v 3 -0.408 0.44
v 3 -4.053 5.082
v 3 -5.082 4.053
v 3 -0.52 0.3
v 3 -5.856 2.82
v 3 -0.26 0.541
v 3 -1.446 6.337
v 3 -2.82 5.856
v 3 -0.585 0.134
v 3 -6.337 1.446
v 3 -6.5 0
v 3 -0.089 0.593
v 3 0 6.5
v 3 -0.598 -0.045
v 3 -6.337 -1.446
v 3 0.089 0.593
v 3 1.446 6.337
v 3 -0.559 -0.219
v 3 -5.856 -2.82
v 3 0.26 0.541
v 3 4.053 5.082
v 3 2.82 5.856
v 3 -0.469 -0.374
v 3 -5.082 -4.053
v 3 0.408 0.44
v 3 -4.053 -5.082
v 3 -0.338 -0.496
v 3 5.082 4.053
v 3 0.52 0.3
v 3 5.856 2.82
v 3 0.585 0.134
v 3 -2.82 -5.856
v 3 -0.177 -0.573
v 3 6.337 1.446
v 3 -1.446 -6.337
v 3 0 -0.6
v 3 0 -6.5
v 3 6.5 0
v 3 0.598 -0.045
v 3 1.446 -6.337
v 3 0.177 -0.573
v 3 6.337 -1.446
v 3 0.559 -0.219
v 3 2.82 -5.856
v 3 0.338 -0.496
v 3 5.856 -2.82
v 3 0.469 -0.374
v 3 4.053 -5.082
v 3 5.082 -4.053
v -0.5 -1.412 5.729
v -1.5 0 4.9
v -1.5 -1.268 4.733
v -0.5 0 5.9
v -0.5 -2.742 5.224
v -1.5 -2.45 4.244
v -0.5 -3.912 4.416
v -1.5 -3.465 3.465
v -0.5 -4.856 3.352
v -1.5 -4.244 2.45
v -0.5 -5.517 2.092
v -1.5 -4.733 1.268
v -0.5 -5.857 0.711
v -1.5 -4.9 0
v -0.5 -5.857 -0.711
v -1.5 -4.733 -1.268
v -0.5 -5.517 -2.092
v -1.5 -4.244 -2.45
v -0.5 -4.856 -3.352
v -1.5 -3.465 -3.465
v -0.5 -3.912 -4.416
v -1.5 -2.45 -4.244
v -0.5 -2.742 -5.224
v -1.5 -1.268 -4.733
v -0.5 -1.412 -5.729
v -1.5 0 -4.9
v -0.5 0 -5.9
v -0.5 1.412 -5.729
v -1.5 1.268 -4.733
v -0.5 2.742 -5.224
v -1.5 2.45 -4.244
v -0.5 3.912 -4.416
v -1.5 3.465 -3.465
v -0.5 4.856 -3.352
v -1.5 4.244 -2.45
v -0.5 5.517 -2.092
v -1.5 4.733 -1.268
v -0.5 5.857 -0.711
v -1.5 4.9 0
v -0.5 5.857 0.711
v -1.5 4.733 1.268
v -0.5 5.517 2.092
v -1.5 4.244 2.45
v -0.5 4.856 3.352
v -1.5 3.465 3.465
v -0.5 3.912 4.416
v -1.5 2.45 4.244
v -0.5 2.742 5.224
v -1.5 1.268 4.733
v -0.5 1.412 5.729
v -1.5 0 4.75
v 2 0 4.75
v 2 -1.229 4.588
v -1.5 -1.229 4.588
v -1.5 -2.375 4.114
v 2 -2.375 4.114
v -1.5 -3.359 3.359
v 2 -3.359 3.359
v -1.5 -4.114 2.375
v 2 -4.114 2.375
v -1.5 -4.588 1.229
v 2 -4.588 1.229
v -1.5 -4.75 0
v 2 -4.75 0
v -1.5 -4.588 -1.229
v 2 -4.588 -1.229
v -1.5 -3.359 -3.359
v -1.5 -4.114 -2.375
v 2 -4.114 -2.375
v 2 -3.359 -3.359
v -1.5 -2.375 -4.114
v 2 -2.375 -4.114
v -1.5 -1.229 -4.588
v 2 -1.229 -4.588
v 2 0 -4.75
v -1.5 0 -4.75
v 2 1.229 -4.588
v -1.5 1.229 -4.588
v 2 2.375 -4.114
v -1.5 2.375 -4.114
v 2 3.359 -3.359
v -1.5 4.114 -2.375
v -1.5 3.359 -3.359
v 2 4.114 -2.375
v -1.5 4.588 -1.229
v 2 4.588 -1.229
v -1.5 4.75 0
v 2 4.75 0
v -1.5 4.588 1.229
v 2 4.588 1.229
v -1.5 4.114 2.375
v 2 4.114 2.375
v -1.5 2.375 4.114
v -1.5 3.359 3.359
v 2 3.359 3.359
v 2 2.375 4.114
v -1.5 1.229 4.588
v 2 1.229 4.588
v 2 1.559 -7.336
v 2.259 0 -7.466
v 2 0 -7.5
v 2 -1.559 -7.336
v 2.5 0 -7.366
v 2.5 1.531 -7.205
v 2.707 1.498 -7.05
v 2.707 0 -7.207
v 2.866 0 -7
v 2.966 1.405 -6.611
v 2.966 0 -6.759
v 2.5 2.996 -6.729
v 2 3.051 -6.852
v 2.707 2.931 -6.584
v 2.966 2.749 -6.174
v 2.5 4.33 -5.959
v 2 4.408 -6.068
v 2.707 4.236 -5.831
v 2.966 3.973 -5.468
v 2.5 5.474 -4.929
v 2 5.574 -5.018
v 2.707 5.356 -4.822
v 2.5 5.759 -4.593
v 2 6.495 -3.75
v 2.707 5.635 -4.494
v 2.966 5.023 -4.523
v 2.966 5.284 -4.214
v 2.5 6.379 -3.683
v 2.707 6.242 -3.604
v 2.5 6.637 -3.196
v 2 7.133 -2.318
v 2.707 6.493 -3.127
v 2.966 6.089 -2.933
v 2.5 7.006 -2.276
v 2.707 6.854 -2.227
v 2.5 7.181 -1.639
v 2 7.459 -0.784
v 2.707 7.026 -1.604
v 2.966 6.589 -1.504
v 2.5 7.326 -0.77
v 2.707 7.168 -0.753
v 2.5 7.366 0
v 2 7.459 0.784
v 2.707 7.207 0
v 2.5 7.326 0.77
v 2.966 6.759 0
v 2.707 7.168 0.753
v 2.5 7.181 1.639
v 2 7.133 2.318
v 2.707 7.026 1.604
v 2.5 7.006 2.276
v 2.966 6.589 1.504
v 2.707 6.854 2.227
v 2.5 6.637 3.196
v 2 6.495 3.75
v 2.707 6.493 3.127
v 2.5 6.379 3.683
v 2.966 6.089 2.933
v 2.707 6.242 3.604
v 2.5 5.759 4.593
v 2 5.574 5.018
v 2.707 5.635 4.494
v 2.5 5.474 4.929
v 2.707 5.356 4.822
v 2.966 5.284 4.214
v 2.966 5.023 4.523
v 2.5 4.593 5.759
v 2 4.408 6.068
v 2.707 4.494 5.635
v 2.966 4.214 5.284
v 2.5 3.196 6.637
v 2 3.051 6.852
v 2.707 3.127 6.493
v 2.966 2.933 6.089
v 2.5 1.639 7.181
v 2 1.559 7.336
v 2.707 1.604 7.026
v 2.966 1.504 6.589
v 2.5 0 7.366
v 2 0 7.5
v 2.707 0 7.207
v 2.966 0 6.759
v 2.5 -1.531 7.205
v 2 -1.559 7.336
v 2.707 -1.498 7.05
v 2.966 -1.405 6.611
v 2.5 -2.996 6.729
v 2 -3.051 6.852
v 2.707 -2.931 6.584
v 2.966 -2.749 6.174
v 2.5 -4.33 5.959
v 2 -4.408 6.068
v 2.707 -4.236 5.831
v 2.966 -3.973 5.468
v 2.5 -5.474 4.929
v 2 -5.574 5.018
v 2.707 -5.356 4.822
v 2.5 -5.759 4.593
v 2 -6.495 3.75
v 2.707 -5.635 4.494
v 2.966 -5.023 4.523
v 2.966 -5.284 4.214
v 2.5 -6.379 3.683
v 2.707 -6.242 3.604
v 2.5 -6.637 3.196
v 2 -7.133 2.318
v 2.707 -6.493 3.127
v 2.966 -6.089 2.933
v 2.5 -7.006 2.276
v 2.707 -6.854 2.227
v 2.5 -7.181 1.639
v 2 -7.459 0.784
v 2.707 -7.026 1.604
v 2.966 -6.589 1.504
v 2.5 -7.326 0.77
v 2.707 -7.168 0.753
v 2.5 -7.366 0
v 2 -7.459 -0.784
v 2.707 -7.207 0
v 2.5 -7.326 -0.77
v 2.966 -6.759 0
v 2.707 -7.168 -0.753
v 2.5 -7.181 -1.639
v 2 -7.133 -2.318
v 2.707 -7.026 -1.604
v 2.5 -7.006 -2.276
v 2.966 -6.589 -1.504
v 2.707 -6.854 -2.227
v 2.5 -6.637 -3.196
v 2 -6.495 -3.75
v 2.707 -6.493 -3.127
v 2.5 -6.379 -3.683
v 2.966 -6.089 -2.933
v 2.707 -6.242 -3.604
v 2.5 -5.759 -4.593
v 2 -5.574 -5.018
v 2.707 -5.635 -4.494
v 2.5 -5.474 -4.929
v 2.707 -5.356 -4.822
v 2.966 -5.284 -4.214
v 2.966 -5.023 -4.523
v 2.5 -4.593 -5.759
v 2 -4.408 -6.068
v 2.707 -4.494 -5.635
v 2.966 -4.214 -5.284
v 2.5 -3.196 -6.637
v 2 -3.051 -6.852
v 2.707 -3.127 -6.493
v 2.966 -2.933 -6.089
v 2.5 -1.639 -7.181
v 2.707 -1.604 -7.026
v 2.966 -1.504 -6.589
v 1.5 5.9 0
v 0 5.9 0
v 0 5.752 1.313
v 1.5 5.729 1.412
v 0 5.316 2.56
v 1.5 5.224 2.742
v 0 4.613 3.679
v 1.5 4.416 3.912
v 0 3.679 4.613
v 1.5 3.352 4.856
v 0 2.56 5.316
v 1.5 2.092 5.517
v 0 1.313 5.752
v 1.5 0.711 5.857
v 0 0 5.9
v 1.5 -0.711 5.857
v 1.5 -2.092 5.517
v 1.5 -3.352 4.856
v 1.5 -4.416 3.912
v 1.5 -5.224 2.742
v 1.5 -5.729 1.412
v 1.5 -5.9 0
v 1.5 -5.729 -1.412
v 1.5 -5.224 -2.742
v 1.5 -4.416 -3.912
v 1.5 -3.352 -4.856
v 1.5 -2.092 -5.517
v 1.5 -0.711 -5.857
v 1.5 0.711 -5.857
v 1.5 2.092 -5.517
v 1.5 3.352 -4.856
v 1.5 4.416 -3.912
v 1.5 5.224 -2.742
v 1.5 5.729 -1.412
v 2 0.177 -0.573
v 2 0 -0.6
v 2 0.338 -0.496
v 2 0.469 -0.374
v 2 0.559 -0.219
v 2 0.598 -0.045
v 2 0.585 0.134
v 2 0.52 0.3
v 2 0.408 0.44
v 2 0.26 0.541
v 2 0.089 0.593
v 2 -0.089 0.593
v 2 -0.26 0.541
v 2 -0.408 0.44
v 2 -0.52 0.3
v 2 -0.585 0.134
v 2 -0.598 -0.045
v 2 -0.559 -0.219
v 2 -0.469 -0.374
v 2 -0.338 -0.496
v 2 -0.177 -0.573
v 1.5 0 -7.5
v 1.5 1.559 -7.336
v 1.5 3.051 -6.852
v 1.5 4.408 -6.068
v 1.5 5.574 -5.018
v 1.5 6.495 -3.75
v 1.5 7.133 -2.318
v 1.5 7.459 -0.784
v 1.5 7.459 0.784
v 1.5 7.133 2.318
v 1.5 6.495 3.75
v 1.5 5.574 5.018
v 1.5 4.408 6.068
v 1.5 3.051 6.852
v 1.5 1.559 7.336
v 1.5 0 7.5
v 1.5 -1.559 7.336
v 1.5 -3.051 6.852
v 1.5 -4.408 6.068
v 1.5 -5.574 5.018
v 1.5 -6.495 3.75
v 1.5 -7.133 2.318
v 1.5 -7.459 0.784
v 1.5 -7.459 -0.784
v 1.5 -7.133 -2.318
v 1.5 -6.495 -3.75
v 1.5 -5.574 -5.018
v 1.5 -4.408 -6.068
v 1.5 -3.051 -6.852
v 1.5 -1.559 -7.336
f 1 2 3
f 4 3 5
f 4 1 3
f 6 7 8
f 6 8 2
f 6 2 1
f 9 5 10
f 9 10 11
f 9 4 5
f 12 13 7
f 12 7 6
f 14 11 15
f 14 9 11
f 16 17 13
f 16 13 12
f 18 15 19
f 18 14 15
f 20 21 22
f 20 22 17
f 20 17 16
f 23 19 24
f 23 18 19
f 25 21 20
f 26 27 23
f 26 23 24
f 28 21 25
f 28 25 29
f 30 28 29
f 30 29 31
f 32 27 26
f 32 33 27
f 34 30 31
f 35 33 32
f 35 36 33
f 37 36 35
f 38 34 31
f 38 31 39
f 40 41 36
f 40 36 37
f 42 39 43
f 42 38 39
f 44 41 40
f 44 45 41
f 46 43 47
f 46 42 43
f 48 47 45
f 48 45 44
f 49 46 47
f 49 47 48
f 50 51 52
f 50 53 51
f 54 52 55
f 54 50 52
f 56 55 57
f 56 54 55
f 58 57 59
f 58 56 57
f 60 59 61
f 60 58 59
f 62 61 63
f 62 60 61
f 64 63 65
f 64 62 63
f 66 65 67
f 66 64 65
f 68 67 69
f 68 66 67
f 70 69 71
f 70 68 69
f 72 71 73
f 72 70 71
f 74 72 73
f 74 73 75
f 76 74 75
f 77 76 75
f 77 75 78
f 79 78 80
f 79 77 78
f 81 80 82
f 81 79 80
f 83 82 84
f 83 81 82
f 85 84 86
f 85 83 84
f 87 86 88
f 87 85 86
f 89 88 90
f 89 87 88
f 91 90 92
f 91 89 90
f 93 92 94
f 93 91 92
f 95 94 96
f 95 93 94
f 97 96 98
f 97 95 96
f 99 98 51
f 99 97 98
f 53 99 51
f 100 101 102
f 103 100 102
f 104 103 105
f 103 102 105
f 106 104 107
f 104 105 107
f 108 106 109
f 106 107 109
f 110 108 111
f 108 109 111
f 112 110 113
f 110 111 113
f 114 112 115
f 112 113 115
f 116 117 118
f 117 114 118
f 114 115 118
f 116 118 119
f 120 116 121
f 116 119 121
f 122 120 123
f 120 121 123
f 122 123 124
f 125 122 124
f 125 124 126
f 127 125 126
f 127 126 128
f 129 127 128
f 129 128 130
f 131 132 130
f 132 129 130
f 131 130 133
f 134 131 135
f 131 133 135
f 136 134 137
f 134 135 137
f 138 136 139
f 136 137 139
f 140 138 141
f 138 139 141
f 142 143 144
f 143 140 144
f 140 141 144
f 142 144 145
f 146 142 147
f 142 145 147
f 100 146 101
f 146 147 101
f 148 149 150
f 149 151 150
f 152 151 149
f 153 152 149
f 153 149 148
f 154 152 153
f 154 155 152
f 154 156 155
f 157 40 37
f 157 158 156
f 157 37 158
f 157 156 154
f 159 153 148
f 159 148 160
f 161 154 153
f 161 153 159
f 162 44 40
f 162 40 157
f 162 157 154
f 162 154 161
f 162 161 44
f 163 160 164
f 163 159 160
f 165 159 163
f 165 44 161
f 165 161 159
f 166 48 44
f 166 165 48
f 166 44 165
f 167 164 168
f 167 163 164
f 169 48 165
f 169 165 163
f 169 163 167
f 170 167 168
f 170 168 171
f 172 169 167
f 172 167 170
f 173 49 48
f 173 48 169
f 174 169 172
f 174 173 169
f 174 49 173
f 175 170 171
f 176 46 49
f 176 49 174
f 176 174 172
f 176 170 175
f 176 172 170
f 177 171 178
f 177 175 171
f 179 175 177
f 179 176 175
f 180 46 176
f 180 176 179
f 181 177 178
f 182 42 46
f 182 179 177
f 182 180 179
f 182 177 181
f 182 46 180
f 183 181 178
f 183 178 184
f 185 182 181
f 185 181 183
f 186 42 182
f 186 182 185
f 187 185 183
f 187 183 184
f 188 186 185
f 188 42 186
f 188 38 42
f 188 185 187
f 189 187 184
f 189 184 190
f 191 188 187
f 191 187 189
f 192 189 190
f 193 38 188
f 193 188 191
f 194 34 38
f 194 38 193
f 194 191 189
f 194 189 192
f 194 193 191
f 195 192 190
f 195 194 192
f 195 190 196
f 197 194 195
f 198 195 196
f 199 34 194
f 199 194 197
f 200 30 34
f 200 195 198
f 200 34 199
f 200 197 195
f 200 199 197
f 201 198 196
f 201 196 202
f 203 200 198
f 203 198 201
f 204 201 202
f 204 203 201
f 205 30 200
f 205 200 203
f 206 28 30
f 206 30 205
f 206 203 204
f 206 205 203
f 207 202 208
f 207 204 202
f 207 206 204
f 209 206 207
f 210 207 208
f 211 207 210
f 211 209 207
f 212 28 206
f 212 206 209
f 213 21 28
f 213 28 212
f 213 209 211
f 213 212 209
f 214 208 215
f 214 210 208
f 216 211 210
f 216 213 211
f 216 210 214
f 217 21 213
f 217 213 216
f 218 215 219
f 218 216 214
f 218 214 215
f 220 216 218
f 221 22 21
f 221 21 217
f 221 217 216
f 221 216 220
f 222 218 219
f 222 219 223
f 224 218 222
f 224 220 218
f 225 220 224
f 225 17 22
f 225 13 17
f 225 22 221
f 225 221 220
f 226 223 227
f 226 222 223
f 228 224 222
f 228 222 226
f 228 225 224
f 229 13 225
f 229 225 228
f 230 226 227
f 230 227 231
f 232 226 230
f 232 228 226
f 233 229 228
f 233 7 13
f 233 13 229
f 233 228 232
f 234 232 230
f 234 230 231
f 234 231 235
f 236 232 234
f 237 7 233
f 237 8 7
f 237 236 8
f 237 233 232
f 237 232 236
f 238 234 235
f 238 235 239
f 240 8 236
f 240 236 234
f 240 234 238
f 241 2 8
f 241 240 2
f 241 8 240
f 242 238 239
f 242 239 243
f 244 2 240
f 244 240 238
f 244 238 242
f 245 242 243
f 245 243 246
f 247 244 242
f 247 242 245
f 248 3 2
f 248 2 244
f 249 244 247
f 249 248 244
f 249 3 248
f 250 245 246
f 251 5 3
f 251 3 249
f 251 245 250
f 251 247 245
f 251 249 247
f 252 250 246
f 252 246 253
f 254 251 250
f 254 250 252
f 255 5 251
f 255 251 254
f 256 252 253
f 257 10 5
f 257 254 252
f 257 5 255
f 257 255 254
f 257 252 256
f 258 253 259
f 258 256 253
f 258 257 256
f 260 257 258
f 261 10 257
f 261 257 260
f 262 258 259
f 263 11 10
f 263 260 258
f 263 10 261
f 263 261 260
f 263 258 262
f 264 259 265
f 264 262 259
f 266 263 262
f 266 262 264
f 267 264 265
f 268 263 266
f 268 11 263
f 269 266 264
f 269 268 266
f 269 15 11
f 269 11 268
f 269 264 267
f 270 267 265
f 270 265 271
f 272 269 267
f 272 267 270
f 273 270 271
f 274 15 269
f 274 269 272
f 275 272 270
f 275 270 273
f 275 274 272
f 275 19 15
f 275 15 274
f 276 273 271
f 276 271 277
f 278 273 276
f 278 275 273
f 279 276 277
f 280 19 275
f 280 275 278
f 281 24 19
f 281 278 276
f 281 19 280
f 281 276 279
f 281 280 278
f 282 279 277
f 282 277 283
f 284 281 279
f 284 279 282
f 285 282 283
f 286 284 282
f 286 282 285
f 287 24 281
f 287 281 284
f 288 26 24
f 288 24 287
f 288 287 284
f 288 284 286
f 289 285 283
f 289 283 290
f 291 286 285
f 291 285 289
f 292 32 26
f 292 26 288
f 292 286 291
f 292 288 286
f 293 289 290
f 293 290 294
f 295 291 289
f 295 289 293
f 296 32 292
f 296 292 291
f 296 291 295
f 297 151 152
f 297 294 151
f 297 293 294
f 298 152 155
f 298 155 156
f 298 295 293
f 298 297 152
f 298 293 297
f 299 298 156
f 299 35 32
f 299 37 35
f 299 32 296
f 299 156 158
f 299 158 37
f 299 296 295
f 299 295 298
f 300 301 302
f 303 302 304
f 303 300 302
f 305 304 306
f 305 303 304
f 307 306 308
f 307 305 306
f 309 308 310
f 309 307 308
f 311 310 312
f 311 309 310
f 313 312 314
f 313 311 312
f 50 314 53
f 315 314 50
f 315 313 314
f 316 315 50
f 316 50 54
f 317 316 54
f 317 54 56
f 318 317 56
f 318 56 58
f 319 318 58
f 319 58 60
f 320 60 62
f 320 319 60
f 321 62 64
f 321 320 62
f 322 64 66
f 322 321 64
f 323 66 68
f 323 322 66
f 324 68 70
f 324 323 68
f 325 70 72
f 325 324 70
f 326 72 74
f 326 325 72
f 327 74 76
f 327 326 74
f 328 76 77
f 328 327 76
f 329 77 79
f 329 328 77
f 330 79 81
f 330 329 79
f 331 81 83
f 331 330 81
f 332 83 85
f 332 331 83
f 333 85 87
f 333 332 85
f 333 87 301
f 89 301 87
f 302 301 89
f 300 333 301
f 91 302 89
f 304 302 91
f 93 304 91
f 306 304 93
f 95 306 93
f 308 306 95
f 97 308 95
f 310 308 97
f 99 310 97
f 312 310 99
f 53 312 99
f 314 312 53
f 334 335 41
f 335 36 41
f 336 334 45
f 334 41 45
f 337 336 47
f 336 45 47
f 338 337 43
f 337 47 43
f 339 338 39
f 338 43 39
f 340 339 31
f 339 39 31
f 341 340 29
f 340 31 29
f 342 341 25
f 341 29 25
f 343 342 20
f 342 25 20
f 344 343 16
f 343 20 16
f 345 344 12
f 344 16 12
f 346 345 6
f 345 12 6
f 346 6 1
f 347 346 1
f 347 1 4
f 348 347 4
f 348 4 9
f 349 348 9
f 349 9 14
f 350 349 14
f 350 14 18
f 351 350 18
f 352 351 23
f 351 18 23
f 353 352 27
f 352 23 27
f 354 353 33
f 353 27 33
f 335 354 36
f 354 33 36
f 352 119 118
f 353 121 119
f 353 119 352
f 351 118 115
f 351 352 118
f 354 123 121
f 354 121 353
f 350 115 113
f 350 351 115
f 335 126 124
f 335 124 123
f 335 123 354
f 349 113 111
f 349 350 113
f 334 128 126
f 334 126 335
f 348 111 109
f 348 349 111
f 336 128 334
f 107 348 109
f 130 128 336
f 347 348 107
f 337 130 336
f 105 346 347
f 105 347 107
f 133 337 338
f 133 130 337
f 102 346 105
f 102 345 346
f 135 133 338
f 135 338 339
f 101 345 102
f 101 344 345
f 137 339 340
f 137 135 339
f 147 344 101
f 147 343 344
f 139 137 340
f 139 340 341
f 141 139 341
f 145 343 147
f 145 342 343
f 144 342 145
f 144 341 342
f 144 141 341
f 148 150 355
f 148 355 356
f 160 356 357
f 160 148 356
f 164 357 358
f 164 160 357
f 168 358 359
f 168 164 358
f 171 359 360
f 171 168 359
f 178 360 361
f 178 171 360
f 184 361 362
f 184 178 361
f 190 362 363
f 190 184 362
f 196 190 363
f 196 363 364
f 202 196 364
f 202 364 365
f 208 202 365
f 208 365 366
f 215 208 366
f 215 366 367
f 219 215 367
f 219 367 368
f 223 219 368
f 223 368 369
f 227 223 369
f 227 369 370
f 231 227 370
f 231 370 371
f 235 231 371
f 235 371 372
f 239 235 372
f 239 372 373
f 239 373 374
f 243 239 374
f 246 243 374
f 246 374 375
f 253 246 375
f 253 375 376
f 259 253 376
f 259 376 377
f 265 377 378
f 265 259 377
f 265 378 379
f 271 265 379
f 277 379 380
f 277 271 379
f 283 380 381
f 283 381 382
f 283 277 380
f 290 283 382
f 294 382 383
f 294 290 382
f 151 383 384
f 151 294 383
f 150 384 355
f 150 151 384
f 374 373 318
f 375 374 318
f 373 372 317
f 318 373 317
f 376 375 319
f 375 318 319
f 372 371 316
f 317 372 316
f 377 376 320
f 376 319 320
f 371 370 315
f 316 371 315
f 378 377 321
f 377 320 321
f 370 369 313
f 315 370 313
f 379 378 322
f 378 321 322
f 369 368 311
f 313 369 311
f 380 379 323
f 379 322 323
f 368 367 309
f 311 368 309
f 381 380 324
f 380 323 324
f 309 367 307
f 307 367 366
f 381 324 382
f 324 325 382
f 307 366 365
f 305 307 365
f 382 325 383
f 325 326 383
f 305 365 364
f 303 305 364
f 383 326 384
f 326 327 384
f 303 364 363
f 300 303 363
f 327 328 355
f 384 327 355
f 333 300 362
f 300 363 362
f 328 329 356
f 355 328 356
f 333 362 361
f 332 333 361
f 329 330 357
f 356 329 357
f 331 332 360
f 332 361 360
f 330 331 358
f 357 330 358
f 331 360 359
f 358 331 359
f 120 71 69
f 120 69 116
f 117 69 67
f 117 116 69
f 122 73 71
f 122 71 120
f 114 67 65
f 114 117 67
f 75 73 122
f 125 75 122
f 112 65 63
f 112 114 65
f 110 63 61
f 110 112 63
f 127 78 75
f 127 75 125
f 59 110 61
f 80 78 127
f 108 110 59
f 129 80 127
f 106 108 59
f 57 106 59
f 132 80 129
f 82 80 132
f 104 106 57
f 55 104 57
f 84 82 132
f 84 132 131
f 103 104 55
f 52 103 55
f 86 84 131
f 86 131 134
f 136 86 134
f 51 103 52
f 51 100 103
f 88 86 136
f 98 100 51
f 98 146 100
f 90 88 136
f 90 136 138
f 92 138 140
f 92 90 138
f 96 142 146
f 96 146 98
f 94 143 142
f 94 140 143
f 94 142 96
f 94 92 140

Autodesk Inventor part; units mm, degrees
ref_plane "YZ Plane" through (0, 0, 0) normal (1, 0, 0) x (0, 1, 0)
ref_plane "XZ Plane" through (0, 0, 0) normal (0, 1, 0) x (-1, 0, 0)
ref_plane "XY Plane" through (0, 0, 0) normal (0, 0, 1) x (1, 0, 0)
sketch "Boceto1" plane through (0, 0, 0) normal (1, 0, 0) x (0, 1, 0)
  circle A0 centre (0, 0) radius 5.9
  dimension "d0" = 11.8
extrude "Extrusión1" add sketch "Boceto1" along normal blind 3
sketch "Boceto2" plane through (3, 0, 0) normal (1, 0, 0) x (0, 0, -1)
  circle A0 centre (0, 0) radius 7.5
  dimension "d3" = 15
extrude "Extrusión2" add sketch "Boceto2" against normal blind 1.5
sketch "Boceto3" plane through (0, 0, 0) normal (-1, 0, 0) x (0, 0, 1)
  circle A0 centre (0, 0) radius 4.75
  dimension "d6" = 9.5
extrude "Extrusión3" cut sketch "Boceto3" against normal blind 2
fillet "Empalme1" radius 1 1 edges at (3, 0, 7.5)
sketch "Boceto4" plane through (3, 0, 0) normal (1, 0, 0) x (0, 0, -1)
  circle A0 centre (0, 0) radius 0.6
  dimension "d13" = 1.2
extrude "Extrusión4" cut sketch "Boceto4" against normal blind 10
sketch "Boceto5" plane through (0, 0, 0) normal (-1, 0, 0) x (0, 0, 1)
  circle A0 centre (0, 0) radius 5.9
  circle A1 centre (0, 0) radius 5.9 projected
  circle A2 centre (0, 0) radius 4.75
extrude "Extrusión5" add sketch "Boceto5" along normal blind 1.5
chamfer "Chaflán2" distance 1 angle 45 1 edges at (-1.5, 0, -5.9)
properties part number "tapa carcasa camara"
